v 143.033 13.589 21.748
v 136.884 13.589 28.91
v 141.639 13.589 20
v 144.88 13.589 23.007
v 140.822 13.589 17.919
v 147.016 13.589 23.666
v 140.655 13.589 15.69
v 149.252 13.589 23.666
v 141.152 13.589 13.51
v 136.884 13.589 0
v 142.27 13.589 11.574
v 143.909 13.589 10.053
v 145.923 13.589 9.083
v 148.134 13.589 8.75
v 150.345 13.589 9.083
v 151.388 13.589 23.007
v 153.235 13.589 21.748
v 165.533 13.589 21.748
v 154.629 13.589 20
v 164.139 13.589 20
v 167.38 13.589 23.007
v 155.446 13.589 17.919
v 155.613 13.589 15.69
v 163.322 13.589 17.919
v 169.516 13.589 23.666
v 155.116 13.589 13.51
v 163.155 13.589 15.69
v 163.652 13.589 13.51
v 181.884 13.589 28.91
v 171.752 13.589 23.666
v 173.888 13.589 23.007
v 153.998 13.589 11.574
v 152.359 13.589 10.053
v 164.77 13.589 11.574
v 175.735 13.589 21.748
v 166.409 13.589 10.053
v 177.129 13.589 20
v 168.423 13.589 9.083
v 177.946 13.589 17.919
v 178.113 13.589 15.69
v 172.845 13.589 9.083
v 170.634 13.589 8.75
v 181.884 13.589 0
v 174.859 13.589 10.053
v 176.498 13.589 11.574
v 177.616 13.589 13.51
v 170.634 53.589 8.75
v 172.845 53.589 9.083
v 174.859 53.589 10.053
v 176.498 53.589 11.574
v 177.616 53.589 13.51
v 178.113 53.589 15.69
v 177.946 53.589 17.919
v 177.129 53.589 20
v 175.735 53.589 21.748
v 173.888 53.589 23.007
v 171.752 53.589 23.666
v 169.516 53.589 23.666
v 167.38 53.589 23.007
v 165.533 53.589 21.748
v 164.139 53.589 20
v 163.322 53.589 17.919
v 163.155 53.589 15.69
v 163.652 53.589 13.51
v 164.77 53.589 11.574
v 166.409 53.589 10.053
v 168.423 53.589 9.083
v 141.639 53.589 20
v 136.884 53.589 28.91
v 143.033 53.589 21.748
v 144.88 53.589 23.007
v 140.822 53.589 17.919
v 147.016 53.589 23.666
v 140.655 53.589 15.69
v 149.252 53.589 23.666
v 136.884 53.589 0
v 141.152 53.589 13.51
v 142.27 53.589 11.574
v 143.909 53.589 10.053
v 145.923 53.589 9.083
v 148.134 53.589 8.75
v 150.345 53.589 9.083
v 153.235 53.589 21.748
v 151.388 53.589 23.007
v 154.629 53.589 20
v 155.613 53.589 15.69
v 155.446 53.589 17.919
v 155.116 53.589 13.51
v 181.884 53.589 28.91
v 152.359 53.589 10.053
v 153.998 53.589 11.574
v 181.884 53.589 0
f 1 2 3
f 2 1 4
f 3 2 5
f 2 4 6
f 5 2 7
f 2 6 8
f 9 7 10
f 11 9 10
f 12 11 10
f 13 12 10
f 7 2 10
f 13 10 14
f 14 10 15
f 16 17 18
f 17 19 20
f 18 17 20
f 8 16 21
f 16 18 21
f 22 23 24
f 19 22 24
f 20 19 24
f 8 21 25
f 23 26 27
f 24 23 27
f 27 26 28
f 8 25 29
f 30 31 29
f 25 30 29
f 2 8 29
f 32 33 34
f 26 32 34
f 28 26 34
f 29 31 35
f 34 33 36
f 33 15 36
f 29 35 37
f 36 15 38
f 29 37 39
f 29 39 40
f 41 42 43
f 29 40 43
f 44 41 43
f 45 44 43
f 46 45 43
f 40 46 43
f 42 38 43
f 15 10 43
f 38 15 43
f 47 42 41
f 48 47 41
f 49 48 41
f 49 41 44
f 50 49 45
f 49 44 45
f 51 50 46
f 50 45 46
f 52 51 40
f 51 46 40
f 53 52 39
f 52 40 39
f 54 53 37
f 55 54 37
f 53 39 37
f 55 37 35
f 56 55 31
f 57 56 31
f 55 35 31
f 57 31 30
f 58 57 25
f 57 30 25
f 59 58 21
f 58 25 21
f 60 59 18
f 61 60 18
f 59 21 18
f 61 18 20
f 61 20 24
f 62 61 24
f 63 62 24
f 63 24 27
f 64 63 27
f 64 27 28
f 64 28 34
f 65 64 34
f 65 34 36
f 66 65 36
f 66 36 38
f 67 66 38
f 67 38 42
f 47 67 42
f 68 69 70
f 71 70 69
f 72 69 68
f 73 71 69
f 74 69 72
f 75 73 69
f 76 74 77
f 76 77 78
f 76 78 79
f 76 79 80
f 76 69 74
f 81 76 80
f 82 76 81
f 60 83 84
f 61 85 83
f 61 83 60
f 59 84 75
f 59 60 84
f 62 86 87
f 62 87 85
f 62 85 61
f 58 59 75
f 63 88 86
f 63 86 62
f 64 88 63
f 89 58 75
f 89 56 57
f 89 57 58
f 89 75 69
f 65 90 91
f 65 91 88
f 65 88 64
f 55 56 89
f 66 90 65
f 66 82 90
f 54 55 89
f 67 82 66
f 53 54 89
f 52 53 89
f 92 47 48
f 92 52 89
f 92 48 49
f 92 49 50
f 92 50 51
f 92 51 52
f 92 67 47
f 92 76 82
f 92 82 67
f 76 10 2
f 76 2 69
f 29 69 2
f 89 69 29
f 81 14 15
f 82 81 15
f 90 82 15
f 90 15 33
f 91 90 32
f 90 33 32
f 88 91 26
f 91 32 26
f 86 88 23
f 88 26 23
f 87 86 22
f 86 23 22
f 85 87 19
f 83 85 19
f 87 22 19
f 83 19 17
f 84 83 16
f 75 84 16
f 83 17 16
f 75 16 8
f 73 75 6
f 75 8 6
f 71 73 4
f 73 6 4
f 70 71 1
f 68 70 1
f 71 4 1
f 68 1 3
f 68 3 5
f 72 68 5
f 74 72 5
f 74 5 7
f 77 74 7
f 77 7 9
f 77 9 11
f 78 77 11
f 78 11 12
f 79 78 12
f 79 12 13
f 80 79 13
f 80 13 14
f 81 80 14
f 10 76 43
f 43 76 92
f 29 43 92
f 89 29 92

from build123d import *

# Parameters (mm, degrees)
SKETCH1_W           = 45
SKETCH1_H           = 40
BOSS_EXTRUDE1_DEPTH = 28.91
SKETCH2_R           = 7.5
CUT_EXTRUDE1_DEPTH  = 189.461126468


with BuildPart() as part:
    # Sketch1 → Boss-Extrude1 (new body)
    with BuildSketch(Plane.XY):
        with Locations((159.384051224, 33.588569403)):
            Rectangle(SKETCH1_W, SKETCH1_H)
    extrude(amount=BOSS_EXTRUDE1_DEPTH)

    # Sketch2 → Cut-Extrude1 (cut, through all)
    with BuildSketch(Plane.XZ.offset(-13.588569403)):
        with Locations(Location((148.134051224, 16.25, 0), (0, 0, 270))):
            Circle(SKETCH2_R)
        with Locations(Location((170.634051224, 16.25, 0), (0, 0, 270))):
            Circle(SKETCH2_R)
    extrude(amount=-CUT_EXTRUDE1_DEPTH, mode=Mode.SUBTRACT)


solid = part.part
